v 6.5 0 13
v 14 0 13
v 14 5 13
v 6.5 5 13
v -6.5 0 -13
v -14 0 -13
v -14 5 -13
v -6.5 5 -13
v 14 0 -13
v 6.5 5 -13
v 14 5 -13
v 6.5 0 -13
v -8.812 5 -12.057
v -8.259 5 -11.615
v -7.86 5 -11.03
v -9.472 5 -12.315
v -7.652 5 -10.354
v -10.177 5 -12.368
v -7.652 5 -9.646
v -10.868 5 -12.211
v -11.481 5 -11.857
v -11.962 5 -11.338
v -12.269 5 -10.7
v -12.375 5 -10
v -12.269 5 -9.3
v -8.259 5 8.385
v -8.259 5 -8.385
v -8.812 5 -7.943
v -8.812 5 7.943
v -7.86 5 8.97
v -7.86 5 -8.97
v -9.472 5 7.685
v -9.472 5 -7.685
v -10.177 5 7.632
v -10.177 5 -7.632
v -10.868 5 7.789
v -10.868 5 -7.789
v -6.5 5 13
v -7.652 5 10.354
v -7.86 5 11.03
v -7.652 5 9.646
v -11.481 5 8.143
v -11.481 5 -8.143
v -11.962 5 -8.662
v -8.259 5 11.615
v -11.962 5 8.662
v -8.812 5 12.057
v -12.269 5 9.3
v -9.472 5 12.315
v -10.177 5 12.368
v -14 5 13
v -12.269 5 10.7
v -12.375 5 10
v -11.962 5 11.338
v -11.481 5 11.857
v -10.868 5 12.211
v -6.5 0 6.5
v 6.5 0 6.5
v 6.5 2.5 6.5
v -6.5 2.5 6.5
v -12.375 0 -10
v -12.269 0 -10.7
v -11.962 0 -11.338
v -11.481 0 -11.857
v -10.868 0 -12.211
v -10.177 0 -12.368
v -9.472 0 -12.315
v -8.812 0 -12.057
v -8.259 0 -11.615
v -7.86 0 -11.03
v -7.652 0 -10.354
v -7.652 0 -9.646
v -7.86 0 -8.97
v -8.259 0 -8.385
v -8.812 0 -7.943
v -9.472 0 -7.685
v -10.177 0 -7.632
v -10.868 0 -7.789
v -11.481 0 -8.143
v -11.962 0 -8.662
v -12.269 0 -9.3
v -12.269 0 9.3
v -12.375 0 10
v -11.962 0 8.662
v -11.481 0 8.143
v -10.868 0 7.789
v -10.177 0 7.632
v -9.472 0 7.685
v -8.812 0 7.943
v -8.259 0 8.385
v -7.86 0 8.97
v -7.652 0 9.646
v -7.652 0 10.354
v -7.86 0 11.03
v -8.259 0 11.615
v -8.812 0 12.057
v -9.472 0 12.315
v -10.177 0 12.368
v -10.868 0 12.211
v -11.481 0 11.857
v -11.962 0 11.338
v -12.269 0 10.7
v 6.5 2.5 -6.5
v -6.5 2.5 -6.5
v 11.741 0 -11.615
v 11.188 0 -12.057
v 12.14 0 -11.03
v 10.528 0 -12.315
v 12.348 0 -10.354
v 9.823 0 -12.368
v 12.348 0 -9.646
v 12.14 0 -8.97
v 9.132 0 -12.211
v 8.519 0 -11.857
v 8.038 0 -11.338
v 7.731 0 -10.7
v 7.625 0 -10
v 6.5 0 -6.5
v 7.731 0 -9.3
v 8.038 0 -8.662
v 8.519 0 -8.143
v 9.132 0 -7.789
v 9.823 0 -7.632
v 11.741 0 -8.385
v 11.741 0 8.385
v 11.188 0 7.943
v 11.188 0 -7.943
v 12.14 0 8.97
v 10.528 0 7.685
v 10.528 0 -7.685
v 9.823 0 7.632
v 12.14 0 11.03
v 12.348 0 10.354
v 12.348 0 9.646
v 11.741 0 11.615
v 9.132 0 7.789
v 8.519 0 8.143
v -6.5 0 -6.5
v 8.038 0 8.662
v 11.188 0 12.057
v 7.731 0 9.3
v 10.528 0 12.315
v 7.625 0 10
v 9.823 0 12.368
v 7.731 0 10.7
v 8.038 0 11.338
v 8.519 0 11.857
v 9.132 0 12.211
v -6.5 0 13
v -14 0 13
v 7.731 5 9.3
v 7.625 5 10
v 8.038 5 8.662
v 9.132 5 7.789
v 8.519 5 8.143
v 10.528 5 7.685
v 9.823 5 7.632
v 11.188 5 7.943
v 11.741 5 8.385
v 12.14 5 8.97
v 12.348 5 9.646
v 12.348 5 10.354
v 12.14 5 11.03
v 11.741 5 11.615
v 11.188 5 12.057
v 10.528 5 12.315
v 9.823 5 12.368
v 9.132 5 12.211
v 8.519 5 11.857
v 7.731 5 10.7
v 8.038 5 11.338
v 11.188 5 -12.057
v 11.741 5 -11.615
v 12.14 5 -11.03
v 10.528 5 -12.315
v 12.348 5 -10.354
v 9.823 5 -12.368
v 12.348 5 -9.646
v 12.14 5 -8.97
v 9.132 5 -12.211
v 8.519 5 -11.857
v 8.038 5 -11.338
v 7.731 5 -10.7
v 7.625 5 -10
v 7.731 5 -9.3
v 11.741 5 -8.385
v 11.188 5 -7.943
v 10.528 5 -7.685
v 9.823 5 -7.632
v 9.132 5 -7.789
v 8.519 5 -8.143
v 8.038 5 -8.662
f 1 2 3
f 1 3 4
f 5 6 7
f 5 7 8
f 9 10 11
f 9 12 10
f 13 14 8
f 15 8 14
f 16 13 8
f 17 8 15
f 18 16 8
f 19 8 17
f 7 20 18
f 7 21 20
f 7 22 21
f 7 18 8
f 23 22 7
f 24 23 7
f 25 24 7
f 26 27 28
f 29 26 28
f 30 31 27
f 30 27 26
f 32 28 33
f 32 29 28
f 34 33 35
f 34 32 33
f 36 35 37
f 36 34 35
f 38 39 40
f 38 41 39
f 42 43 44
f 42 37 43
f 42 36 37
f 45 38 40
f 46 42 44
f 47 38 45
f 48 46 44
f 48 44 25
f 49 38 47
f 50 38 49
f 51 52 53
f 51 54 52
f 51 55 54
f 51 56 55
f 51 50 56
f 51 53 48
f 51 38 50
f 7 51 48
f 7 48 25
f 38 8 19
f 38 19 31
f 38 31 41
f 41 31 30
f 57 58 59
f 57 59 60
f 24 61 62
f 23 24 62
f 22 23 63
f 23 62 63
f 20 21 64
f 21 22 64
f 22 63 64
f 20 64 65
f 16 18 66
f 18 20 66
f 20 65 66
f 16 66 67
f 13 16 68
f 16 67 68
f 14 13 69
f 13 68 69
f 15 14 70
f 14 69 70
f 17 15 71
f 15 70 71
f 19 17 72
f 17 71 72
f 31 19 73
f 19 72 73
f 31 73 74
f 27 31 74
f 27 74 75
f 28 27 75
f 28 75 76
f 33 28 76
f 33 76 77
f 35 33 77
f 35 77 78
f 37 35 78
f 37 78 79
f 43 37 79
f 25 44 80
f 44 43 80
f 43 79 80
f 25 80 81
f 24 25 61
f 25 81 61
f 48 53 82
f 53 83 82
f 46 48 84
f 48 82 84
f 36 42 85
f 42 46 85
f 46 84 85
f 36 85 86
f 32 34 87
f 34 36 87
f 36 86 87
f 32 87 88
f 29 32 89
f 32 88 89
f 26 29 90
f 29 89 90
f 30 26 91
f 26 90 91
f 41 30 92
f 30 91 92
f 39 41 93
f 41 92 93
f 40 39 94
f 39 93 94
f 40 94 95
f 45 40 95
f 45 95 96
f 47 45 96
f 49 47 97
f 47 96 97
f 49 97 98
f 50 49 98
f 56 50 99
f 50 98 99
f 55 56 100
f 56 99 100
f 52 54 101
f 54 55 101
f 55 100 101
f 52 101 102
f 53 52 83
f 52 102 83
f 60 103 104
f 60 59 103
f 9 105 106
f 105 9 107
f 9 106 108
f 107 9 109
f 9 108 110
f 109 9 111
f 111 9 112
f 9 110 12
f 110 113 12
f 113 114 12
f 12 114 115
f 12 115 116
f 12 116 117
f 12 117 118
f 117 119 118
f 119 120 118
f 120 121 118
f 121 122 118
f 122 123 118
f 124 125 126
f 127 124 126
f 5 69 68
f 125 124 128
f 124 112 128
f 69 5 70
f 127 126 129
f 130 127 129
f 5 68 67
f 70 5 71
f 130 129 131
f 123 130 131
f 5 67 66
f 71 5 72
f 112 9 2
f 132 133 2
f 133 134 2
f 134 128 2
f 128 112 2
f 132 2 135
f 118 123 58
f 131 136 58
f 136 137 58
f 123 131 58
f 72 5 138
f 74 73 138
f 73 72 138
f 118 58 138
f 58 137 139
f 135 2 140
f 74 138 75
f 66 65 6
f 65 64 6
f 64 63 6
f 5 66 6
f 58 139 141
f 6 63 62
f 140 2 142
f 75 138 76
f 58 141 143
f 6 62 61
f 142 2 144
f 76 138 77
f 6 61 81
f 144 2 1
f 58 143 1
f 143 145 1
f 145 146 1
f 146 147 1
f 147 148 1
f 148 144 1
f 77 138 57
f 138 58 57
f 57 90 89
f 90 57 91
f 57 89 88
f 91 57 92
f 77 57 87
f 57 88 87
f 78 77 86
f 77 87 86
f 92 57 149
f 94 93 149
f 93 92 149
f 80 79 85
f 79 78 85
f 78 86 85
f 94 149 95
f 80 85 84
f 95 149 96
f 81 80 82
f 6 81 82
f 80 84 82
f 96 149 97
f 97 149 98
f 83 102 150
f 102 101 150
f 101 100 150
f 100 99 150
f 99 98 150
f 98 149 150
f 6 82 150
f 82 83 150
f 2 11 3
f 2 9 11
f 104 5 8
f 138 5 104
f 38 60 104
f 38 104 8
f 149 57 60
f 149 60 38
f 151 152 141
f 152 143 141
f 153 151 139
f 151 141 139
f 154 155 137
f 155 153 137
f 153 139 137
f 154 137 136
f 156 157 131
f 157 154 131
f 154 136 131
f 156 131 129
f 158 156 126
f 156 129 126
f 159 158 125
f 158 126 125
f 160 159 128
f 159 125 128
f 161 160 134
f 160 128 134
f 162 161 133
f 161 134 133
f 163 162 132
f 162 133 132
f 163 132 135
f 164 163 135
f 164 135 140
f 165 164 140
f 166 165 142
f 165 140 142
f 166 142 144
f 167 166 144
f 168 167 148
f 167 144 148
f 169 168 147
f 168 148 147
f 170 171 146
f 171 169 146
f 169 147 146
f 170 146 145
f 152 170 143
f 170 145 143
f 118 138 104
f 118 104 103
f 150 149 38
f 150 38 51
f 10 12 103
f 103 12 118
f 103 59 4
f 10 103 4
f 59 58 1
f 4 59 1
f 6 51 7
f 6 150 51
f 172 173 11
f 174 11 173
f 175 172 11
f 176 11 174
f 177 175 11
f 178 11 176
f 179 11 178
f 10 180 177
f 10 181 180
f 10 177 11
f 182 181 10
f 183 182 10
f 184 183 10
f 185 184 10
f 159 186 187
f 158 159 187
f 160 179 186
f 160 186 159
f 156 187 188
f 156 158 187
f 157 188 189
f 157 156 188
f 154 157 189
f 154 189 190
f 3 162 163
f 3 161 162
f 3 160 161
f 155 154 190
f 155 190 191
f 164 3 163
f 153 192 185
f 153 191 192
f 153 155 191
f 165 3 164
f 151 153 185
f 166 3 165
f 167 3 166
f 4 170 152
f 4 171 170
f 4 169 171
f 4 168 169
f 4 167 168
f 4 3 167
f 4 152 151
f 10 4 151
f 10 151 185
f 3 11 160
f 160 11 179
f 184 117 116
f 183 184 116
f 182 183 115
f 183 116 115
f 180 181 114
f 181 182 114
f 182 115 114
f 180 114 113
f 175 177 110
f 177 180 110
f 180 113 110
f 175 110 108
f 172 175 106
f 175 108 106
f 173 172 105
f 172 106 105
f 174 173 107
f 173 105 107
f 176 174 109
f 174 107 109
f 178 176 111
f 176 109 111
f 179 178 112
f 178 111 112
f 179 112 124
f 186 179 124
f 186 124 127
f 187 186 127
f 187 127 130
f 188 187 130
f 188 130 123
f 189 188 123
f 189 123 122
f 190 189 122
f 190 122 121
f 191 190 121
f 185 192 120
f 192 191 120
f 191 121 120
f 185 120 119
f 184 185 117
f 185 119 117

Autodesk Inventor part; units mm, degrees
ref_plane "YZ Plane" through (0, 0, 0) normal (1, 0, 0) x (0, 1, 0)
ref_plane "XZ Plane" through (0, 0, 0) normal (0, 1, 0) x (-1, 0, 0)
ref_plane "XY Plane" through (0, 0, 0) normal (0, 0, 1) x (1, 0, 0)
sketch "Sketch1" plane through (0, 0, 0) normal (0, 1, 0) x (-1, 0, 0)
  line L0 (-6.5, 6.5) -> (6.5, 6.5)
  line L1 (6.5, 6.5) -> (6.5, -6.5)
  line L2 (6.5, -6.5) -> (-6.5, -6.5)
  line L3 (-6.5, -6.5) -> (-6.5, 6.5)
  line L4 (-6.5, 6.5) -> (6.5, -6.5) construction
  line L5 (6.5, 6.5) -> (-6.5, -6.5) construction
  circle A0 centre (10, 10) radius 2.375
  circle A1 centre (10, -10) radius 2.375
  circle A2 centre (-10, 10) radius 2.375
  circle A3 centre (-10, -10) radius 2.375
  line L6 (-14, 13) -> (14, 13)
  line L7 (14, 13) -> (14, -13)
  line L8 (14, -13) -> (-14, -13)
  line L9 (-14, -13) -> (-14, 13)
  line L10 (-14, 13) -> (14, -13) construction
  line L11 (14, 13) -> (-14, -13) construction
  line L12 (6.5, 6.5) -> (6.5, 13)
  line L13 (-6.5, 6.5) -> (-6.5, 13)
  line L14 (-6.5, -6.5) -> (-6.5, -13)
  line L15 (6.5, -6.5) -> (6.5, -13)
  point P0 (0, 0)
  dimension "d0" = 13
  dimension "d1" = 13
  dimension "d2" = 4.75
  dimension "d3" = 3.5
  dimension "d4" = 3.5
  dimension "d5" = 3.5
  dimension "d6" = 3.5
  dimension "d9" = 28
  dimension "d10" = 26
extrude "Extrusion1" add sketch "Sketch1" along normal blind 5 contours L3 L14 L8 L9 L6 L13 | L12 L6 L7 L8 L15 L1
extrude "Extrusion2" add sketch "Sketch1" along normal blind 2.5 contours L0 L1 L2 L3
properties part number "PCB_Housing_08_V4"
